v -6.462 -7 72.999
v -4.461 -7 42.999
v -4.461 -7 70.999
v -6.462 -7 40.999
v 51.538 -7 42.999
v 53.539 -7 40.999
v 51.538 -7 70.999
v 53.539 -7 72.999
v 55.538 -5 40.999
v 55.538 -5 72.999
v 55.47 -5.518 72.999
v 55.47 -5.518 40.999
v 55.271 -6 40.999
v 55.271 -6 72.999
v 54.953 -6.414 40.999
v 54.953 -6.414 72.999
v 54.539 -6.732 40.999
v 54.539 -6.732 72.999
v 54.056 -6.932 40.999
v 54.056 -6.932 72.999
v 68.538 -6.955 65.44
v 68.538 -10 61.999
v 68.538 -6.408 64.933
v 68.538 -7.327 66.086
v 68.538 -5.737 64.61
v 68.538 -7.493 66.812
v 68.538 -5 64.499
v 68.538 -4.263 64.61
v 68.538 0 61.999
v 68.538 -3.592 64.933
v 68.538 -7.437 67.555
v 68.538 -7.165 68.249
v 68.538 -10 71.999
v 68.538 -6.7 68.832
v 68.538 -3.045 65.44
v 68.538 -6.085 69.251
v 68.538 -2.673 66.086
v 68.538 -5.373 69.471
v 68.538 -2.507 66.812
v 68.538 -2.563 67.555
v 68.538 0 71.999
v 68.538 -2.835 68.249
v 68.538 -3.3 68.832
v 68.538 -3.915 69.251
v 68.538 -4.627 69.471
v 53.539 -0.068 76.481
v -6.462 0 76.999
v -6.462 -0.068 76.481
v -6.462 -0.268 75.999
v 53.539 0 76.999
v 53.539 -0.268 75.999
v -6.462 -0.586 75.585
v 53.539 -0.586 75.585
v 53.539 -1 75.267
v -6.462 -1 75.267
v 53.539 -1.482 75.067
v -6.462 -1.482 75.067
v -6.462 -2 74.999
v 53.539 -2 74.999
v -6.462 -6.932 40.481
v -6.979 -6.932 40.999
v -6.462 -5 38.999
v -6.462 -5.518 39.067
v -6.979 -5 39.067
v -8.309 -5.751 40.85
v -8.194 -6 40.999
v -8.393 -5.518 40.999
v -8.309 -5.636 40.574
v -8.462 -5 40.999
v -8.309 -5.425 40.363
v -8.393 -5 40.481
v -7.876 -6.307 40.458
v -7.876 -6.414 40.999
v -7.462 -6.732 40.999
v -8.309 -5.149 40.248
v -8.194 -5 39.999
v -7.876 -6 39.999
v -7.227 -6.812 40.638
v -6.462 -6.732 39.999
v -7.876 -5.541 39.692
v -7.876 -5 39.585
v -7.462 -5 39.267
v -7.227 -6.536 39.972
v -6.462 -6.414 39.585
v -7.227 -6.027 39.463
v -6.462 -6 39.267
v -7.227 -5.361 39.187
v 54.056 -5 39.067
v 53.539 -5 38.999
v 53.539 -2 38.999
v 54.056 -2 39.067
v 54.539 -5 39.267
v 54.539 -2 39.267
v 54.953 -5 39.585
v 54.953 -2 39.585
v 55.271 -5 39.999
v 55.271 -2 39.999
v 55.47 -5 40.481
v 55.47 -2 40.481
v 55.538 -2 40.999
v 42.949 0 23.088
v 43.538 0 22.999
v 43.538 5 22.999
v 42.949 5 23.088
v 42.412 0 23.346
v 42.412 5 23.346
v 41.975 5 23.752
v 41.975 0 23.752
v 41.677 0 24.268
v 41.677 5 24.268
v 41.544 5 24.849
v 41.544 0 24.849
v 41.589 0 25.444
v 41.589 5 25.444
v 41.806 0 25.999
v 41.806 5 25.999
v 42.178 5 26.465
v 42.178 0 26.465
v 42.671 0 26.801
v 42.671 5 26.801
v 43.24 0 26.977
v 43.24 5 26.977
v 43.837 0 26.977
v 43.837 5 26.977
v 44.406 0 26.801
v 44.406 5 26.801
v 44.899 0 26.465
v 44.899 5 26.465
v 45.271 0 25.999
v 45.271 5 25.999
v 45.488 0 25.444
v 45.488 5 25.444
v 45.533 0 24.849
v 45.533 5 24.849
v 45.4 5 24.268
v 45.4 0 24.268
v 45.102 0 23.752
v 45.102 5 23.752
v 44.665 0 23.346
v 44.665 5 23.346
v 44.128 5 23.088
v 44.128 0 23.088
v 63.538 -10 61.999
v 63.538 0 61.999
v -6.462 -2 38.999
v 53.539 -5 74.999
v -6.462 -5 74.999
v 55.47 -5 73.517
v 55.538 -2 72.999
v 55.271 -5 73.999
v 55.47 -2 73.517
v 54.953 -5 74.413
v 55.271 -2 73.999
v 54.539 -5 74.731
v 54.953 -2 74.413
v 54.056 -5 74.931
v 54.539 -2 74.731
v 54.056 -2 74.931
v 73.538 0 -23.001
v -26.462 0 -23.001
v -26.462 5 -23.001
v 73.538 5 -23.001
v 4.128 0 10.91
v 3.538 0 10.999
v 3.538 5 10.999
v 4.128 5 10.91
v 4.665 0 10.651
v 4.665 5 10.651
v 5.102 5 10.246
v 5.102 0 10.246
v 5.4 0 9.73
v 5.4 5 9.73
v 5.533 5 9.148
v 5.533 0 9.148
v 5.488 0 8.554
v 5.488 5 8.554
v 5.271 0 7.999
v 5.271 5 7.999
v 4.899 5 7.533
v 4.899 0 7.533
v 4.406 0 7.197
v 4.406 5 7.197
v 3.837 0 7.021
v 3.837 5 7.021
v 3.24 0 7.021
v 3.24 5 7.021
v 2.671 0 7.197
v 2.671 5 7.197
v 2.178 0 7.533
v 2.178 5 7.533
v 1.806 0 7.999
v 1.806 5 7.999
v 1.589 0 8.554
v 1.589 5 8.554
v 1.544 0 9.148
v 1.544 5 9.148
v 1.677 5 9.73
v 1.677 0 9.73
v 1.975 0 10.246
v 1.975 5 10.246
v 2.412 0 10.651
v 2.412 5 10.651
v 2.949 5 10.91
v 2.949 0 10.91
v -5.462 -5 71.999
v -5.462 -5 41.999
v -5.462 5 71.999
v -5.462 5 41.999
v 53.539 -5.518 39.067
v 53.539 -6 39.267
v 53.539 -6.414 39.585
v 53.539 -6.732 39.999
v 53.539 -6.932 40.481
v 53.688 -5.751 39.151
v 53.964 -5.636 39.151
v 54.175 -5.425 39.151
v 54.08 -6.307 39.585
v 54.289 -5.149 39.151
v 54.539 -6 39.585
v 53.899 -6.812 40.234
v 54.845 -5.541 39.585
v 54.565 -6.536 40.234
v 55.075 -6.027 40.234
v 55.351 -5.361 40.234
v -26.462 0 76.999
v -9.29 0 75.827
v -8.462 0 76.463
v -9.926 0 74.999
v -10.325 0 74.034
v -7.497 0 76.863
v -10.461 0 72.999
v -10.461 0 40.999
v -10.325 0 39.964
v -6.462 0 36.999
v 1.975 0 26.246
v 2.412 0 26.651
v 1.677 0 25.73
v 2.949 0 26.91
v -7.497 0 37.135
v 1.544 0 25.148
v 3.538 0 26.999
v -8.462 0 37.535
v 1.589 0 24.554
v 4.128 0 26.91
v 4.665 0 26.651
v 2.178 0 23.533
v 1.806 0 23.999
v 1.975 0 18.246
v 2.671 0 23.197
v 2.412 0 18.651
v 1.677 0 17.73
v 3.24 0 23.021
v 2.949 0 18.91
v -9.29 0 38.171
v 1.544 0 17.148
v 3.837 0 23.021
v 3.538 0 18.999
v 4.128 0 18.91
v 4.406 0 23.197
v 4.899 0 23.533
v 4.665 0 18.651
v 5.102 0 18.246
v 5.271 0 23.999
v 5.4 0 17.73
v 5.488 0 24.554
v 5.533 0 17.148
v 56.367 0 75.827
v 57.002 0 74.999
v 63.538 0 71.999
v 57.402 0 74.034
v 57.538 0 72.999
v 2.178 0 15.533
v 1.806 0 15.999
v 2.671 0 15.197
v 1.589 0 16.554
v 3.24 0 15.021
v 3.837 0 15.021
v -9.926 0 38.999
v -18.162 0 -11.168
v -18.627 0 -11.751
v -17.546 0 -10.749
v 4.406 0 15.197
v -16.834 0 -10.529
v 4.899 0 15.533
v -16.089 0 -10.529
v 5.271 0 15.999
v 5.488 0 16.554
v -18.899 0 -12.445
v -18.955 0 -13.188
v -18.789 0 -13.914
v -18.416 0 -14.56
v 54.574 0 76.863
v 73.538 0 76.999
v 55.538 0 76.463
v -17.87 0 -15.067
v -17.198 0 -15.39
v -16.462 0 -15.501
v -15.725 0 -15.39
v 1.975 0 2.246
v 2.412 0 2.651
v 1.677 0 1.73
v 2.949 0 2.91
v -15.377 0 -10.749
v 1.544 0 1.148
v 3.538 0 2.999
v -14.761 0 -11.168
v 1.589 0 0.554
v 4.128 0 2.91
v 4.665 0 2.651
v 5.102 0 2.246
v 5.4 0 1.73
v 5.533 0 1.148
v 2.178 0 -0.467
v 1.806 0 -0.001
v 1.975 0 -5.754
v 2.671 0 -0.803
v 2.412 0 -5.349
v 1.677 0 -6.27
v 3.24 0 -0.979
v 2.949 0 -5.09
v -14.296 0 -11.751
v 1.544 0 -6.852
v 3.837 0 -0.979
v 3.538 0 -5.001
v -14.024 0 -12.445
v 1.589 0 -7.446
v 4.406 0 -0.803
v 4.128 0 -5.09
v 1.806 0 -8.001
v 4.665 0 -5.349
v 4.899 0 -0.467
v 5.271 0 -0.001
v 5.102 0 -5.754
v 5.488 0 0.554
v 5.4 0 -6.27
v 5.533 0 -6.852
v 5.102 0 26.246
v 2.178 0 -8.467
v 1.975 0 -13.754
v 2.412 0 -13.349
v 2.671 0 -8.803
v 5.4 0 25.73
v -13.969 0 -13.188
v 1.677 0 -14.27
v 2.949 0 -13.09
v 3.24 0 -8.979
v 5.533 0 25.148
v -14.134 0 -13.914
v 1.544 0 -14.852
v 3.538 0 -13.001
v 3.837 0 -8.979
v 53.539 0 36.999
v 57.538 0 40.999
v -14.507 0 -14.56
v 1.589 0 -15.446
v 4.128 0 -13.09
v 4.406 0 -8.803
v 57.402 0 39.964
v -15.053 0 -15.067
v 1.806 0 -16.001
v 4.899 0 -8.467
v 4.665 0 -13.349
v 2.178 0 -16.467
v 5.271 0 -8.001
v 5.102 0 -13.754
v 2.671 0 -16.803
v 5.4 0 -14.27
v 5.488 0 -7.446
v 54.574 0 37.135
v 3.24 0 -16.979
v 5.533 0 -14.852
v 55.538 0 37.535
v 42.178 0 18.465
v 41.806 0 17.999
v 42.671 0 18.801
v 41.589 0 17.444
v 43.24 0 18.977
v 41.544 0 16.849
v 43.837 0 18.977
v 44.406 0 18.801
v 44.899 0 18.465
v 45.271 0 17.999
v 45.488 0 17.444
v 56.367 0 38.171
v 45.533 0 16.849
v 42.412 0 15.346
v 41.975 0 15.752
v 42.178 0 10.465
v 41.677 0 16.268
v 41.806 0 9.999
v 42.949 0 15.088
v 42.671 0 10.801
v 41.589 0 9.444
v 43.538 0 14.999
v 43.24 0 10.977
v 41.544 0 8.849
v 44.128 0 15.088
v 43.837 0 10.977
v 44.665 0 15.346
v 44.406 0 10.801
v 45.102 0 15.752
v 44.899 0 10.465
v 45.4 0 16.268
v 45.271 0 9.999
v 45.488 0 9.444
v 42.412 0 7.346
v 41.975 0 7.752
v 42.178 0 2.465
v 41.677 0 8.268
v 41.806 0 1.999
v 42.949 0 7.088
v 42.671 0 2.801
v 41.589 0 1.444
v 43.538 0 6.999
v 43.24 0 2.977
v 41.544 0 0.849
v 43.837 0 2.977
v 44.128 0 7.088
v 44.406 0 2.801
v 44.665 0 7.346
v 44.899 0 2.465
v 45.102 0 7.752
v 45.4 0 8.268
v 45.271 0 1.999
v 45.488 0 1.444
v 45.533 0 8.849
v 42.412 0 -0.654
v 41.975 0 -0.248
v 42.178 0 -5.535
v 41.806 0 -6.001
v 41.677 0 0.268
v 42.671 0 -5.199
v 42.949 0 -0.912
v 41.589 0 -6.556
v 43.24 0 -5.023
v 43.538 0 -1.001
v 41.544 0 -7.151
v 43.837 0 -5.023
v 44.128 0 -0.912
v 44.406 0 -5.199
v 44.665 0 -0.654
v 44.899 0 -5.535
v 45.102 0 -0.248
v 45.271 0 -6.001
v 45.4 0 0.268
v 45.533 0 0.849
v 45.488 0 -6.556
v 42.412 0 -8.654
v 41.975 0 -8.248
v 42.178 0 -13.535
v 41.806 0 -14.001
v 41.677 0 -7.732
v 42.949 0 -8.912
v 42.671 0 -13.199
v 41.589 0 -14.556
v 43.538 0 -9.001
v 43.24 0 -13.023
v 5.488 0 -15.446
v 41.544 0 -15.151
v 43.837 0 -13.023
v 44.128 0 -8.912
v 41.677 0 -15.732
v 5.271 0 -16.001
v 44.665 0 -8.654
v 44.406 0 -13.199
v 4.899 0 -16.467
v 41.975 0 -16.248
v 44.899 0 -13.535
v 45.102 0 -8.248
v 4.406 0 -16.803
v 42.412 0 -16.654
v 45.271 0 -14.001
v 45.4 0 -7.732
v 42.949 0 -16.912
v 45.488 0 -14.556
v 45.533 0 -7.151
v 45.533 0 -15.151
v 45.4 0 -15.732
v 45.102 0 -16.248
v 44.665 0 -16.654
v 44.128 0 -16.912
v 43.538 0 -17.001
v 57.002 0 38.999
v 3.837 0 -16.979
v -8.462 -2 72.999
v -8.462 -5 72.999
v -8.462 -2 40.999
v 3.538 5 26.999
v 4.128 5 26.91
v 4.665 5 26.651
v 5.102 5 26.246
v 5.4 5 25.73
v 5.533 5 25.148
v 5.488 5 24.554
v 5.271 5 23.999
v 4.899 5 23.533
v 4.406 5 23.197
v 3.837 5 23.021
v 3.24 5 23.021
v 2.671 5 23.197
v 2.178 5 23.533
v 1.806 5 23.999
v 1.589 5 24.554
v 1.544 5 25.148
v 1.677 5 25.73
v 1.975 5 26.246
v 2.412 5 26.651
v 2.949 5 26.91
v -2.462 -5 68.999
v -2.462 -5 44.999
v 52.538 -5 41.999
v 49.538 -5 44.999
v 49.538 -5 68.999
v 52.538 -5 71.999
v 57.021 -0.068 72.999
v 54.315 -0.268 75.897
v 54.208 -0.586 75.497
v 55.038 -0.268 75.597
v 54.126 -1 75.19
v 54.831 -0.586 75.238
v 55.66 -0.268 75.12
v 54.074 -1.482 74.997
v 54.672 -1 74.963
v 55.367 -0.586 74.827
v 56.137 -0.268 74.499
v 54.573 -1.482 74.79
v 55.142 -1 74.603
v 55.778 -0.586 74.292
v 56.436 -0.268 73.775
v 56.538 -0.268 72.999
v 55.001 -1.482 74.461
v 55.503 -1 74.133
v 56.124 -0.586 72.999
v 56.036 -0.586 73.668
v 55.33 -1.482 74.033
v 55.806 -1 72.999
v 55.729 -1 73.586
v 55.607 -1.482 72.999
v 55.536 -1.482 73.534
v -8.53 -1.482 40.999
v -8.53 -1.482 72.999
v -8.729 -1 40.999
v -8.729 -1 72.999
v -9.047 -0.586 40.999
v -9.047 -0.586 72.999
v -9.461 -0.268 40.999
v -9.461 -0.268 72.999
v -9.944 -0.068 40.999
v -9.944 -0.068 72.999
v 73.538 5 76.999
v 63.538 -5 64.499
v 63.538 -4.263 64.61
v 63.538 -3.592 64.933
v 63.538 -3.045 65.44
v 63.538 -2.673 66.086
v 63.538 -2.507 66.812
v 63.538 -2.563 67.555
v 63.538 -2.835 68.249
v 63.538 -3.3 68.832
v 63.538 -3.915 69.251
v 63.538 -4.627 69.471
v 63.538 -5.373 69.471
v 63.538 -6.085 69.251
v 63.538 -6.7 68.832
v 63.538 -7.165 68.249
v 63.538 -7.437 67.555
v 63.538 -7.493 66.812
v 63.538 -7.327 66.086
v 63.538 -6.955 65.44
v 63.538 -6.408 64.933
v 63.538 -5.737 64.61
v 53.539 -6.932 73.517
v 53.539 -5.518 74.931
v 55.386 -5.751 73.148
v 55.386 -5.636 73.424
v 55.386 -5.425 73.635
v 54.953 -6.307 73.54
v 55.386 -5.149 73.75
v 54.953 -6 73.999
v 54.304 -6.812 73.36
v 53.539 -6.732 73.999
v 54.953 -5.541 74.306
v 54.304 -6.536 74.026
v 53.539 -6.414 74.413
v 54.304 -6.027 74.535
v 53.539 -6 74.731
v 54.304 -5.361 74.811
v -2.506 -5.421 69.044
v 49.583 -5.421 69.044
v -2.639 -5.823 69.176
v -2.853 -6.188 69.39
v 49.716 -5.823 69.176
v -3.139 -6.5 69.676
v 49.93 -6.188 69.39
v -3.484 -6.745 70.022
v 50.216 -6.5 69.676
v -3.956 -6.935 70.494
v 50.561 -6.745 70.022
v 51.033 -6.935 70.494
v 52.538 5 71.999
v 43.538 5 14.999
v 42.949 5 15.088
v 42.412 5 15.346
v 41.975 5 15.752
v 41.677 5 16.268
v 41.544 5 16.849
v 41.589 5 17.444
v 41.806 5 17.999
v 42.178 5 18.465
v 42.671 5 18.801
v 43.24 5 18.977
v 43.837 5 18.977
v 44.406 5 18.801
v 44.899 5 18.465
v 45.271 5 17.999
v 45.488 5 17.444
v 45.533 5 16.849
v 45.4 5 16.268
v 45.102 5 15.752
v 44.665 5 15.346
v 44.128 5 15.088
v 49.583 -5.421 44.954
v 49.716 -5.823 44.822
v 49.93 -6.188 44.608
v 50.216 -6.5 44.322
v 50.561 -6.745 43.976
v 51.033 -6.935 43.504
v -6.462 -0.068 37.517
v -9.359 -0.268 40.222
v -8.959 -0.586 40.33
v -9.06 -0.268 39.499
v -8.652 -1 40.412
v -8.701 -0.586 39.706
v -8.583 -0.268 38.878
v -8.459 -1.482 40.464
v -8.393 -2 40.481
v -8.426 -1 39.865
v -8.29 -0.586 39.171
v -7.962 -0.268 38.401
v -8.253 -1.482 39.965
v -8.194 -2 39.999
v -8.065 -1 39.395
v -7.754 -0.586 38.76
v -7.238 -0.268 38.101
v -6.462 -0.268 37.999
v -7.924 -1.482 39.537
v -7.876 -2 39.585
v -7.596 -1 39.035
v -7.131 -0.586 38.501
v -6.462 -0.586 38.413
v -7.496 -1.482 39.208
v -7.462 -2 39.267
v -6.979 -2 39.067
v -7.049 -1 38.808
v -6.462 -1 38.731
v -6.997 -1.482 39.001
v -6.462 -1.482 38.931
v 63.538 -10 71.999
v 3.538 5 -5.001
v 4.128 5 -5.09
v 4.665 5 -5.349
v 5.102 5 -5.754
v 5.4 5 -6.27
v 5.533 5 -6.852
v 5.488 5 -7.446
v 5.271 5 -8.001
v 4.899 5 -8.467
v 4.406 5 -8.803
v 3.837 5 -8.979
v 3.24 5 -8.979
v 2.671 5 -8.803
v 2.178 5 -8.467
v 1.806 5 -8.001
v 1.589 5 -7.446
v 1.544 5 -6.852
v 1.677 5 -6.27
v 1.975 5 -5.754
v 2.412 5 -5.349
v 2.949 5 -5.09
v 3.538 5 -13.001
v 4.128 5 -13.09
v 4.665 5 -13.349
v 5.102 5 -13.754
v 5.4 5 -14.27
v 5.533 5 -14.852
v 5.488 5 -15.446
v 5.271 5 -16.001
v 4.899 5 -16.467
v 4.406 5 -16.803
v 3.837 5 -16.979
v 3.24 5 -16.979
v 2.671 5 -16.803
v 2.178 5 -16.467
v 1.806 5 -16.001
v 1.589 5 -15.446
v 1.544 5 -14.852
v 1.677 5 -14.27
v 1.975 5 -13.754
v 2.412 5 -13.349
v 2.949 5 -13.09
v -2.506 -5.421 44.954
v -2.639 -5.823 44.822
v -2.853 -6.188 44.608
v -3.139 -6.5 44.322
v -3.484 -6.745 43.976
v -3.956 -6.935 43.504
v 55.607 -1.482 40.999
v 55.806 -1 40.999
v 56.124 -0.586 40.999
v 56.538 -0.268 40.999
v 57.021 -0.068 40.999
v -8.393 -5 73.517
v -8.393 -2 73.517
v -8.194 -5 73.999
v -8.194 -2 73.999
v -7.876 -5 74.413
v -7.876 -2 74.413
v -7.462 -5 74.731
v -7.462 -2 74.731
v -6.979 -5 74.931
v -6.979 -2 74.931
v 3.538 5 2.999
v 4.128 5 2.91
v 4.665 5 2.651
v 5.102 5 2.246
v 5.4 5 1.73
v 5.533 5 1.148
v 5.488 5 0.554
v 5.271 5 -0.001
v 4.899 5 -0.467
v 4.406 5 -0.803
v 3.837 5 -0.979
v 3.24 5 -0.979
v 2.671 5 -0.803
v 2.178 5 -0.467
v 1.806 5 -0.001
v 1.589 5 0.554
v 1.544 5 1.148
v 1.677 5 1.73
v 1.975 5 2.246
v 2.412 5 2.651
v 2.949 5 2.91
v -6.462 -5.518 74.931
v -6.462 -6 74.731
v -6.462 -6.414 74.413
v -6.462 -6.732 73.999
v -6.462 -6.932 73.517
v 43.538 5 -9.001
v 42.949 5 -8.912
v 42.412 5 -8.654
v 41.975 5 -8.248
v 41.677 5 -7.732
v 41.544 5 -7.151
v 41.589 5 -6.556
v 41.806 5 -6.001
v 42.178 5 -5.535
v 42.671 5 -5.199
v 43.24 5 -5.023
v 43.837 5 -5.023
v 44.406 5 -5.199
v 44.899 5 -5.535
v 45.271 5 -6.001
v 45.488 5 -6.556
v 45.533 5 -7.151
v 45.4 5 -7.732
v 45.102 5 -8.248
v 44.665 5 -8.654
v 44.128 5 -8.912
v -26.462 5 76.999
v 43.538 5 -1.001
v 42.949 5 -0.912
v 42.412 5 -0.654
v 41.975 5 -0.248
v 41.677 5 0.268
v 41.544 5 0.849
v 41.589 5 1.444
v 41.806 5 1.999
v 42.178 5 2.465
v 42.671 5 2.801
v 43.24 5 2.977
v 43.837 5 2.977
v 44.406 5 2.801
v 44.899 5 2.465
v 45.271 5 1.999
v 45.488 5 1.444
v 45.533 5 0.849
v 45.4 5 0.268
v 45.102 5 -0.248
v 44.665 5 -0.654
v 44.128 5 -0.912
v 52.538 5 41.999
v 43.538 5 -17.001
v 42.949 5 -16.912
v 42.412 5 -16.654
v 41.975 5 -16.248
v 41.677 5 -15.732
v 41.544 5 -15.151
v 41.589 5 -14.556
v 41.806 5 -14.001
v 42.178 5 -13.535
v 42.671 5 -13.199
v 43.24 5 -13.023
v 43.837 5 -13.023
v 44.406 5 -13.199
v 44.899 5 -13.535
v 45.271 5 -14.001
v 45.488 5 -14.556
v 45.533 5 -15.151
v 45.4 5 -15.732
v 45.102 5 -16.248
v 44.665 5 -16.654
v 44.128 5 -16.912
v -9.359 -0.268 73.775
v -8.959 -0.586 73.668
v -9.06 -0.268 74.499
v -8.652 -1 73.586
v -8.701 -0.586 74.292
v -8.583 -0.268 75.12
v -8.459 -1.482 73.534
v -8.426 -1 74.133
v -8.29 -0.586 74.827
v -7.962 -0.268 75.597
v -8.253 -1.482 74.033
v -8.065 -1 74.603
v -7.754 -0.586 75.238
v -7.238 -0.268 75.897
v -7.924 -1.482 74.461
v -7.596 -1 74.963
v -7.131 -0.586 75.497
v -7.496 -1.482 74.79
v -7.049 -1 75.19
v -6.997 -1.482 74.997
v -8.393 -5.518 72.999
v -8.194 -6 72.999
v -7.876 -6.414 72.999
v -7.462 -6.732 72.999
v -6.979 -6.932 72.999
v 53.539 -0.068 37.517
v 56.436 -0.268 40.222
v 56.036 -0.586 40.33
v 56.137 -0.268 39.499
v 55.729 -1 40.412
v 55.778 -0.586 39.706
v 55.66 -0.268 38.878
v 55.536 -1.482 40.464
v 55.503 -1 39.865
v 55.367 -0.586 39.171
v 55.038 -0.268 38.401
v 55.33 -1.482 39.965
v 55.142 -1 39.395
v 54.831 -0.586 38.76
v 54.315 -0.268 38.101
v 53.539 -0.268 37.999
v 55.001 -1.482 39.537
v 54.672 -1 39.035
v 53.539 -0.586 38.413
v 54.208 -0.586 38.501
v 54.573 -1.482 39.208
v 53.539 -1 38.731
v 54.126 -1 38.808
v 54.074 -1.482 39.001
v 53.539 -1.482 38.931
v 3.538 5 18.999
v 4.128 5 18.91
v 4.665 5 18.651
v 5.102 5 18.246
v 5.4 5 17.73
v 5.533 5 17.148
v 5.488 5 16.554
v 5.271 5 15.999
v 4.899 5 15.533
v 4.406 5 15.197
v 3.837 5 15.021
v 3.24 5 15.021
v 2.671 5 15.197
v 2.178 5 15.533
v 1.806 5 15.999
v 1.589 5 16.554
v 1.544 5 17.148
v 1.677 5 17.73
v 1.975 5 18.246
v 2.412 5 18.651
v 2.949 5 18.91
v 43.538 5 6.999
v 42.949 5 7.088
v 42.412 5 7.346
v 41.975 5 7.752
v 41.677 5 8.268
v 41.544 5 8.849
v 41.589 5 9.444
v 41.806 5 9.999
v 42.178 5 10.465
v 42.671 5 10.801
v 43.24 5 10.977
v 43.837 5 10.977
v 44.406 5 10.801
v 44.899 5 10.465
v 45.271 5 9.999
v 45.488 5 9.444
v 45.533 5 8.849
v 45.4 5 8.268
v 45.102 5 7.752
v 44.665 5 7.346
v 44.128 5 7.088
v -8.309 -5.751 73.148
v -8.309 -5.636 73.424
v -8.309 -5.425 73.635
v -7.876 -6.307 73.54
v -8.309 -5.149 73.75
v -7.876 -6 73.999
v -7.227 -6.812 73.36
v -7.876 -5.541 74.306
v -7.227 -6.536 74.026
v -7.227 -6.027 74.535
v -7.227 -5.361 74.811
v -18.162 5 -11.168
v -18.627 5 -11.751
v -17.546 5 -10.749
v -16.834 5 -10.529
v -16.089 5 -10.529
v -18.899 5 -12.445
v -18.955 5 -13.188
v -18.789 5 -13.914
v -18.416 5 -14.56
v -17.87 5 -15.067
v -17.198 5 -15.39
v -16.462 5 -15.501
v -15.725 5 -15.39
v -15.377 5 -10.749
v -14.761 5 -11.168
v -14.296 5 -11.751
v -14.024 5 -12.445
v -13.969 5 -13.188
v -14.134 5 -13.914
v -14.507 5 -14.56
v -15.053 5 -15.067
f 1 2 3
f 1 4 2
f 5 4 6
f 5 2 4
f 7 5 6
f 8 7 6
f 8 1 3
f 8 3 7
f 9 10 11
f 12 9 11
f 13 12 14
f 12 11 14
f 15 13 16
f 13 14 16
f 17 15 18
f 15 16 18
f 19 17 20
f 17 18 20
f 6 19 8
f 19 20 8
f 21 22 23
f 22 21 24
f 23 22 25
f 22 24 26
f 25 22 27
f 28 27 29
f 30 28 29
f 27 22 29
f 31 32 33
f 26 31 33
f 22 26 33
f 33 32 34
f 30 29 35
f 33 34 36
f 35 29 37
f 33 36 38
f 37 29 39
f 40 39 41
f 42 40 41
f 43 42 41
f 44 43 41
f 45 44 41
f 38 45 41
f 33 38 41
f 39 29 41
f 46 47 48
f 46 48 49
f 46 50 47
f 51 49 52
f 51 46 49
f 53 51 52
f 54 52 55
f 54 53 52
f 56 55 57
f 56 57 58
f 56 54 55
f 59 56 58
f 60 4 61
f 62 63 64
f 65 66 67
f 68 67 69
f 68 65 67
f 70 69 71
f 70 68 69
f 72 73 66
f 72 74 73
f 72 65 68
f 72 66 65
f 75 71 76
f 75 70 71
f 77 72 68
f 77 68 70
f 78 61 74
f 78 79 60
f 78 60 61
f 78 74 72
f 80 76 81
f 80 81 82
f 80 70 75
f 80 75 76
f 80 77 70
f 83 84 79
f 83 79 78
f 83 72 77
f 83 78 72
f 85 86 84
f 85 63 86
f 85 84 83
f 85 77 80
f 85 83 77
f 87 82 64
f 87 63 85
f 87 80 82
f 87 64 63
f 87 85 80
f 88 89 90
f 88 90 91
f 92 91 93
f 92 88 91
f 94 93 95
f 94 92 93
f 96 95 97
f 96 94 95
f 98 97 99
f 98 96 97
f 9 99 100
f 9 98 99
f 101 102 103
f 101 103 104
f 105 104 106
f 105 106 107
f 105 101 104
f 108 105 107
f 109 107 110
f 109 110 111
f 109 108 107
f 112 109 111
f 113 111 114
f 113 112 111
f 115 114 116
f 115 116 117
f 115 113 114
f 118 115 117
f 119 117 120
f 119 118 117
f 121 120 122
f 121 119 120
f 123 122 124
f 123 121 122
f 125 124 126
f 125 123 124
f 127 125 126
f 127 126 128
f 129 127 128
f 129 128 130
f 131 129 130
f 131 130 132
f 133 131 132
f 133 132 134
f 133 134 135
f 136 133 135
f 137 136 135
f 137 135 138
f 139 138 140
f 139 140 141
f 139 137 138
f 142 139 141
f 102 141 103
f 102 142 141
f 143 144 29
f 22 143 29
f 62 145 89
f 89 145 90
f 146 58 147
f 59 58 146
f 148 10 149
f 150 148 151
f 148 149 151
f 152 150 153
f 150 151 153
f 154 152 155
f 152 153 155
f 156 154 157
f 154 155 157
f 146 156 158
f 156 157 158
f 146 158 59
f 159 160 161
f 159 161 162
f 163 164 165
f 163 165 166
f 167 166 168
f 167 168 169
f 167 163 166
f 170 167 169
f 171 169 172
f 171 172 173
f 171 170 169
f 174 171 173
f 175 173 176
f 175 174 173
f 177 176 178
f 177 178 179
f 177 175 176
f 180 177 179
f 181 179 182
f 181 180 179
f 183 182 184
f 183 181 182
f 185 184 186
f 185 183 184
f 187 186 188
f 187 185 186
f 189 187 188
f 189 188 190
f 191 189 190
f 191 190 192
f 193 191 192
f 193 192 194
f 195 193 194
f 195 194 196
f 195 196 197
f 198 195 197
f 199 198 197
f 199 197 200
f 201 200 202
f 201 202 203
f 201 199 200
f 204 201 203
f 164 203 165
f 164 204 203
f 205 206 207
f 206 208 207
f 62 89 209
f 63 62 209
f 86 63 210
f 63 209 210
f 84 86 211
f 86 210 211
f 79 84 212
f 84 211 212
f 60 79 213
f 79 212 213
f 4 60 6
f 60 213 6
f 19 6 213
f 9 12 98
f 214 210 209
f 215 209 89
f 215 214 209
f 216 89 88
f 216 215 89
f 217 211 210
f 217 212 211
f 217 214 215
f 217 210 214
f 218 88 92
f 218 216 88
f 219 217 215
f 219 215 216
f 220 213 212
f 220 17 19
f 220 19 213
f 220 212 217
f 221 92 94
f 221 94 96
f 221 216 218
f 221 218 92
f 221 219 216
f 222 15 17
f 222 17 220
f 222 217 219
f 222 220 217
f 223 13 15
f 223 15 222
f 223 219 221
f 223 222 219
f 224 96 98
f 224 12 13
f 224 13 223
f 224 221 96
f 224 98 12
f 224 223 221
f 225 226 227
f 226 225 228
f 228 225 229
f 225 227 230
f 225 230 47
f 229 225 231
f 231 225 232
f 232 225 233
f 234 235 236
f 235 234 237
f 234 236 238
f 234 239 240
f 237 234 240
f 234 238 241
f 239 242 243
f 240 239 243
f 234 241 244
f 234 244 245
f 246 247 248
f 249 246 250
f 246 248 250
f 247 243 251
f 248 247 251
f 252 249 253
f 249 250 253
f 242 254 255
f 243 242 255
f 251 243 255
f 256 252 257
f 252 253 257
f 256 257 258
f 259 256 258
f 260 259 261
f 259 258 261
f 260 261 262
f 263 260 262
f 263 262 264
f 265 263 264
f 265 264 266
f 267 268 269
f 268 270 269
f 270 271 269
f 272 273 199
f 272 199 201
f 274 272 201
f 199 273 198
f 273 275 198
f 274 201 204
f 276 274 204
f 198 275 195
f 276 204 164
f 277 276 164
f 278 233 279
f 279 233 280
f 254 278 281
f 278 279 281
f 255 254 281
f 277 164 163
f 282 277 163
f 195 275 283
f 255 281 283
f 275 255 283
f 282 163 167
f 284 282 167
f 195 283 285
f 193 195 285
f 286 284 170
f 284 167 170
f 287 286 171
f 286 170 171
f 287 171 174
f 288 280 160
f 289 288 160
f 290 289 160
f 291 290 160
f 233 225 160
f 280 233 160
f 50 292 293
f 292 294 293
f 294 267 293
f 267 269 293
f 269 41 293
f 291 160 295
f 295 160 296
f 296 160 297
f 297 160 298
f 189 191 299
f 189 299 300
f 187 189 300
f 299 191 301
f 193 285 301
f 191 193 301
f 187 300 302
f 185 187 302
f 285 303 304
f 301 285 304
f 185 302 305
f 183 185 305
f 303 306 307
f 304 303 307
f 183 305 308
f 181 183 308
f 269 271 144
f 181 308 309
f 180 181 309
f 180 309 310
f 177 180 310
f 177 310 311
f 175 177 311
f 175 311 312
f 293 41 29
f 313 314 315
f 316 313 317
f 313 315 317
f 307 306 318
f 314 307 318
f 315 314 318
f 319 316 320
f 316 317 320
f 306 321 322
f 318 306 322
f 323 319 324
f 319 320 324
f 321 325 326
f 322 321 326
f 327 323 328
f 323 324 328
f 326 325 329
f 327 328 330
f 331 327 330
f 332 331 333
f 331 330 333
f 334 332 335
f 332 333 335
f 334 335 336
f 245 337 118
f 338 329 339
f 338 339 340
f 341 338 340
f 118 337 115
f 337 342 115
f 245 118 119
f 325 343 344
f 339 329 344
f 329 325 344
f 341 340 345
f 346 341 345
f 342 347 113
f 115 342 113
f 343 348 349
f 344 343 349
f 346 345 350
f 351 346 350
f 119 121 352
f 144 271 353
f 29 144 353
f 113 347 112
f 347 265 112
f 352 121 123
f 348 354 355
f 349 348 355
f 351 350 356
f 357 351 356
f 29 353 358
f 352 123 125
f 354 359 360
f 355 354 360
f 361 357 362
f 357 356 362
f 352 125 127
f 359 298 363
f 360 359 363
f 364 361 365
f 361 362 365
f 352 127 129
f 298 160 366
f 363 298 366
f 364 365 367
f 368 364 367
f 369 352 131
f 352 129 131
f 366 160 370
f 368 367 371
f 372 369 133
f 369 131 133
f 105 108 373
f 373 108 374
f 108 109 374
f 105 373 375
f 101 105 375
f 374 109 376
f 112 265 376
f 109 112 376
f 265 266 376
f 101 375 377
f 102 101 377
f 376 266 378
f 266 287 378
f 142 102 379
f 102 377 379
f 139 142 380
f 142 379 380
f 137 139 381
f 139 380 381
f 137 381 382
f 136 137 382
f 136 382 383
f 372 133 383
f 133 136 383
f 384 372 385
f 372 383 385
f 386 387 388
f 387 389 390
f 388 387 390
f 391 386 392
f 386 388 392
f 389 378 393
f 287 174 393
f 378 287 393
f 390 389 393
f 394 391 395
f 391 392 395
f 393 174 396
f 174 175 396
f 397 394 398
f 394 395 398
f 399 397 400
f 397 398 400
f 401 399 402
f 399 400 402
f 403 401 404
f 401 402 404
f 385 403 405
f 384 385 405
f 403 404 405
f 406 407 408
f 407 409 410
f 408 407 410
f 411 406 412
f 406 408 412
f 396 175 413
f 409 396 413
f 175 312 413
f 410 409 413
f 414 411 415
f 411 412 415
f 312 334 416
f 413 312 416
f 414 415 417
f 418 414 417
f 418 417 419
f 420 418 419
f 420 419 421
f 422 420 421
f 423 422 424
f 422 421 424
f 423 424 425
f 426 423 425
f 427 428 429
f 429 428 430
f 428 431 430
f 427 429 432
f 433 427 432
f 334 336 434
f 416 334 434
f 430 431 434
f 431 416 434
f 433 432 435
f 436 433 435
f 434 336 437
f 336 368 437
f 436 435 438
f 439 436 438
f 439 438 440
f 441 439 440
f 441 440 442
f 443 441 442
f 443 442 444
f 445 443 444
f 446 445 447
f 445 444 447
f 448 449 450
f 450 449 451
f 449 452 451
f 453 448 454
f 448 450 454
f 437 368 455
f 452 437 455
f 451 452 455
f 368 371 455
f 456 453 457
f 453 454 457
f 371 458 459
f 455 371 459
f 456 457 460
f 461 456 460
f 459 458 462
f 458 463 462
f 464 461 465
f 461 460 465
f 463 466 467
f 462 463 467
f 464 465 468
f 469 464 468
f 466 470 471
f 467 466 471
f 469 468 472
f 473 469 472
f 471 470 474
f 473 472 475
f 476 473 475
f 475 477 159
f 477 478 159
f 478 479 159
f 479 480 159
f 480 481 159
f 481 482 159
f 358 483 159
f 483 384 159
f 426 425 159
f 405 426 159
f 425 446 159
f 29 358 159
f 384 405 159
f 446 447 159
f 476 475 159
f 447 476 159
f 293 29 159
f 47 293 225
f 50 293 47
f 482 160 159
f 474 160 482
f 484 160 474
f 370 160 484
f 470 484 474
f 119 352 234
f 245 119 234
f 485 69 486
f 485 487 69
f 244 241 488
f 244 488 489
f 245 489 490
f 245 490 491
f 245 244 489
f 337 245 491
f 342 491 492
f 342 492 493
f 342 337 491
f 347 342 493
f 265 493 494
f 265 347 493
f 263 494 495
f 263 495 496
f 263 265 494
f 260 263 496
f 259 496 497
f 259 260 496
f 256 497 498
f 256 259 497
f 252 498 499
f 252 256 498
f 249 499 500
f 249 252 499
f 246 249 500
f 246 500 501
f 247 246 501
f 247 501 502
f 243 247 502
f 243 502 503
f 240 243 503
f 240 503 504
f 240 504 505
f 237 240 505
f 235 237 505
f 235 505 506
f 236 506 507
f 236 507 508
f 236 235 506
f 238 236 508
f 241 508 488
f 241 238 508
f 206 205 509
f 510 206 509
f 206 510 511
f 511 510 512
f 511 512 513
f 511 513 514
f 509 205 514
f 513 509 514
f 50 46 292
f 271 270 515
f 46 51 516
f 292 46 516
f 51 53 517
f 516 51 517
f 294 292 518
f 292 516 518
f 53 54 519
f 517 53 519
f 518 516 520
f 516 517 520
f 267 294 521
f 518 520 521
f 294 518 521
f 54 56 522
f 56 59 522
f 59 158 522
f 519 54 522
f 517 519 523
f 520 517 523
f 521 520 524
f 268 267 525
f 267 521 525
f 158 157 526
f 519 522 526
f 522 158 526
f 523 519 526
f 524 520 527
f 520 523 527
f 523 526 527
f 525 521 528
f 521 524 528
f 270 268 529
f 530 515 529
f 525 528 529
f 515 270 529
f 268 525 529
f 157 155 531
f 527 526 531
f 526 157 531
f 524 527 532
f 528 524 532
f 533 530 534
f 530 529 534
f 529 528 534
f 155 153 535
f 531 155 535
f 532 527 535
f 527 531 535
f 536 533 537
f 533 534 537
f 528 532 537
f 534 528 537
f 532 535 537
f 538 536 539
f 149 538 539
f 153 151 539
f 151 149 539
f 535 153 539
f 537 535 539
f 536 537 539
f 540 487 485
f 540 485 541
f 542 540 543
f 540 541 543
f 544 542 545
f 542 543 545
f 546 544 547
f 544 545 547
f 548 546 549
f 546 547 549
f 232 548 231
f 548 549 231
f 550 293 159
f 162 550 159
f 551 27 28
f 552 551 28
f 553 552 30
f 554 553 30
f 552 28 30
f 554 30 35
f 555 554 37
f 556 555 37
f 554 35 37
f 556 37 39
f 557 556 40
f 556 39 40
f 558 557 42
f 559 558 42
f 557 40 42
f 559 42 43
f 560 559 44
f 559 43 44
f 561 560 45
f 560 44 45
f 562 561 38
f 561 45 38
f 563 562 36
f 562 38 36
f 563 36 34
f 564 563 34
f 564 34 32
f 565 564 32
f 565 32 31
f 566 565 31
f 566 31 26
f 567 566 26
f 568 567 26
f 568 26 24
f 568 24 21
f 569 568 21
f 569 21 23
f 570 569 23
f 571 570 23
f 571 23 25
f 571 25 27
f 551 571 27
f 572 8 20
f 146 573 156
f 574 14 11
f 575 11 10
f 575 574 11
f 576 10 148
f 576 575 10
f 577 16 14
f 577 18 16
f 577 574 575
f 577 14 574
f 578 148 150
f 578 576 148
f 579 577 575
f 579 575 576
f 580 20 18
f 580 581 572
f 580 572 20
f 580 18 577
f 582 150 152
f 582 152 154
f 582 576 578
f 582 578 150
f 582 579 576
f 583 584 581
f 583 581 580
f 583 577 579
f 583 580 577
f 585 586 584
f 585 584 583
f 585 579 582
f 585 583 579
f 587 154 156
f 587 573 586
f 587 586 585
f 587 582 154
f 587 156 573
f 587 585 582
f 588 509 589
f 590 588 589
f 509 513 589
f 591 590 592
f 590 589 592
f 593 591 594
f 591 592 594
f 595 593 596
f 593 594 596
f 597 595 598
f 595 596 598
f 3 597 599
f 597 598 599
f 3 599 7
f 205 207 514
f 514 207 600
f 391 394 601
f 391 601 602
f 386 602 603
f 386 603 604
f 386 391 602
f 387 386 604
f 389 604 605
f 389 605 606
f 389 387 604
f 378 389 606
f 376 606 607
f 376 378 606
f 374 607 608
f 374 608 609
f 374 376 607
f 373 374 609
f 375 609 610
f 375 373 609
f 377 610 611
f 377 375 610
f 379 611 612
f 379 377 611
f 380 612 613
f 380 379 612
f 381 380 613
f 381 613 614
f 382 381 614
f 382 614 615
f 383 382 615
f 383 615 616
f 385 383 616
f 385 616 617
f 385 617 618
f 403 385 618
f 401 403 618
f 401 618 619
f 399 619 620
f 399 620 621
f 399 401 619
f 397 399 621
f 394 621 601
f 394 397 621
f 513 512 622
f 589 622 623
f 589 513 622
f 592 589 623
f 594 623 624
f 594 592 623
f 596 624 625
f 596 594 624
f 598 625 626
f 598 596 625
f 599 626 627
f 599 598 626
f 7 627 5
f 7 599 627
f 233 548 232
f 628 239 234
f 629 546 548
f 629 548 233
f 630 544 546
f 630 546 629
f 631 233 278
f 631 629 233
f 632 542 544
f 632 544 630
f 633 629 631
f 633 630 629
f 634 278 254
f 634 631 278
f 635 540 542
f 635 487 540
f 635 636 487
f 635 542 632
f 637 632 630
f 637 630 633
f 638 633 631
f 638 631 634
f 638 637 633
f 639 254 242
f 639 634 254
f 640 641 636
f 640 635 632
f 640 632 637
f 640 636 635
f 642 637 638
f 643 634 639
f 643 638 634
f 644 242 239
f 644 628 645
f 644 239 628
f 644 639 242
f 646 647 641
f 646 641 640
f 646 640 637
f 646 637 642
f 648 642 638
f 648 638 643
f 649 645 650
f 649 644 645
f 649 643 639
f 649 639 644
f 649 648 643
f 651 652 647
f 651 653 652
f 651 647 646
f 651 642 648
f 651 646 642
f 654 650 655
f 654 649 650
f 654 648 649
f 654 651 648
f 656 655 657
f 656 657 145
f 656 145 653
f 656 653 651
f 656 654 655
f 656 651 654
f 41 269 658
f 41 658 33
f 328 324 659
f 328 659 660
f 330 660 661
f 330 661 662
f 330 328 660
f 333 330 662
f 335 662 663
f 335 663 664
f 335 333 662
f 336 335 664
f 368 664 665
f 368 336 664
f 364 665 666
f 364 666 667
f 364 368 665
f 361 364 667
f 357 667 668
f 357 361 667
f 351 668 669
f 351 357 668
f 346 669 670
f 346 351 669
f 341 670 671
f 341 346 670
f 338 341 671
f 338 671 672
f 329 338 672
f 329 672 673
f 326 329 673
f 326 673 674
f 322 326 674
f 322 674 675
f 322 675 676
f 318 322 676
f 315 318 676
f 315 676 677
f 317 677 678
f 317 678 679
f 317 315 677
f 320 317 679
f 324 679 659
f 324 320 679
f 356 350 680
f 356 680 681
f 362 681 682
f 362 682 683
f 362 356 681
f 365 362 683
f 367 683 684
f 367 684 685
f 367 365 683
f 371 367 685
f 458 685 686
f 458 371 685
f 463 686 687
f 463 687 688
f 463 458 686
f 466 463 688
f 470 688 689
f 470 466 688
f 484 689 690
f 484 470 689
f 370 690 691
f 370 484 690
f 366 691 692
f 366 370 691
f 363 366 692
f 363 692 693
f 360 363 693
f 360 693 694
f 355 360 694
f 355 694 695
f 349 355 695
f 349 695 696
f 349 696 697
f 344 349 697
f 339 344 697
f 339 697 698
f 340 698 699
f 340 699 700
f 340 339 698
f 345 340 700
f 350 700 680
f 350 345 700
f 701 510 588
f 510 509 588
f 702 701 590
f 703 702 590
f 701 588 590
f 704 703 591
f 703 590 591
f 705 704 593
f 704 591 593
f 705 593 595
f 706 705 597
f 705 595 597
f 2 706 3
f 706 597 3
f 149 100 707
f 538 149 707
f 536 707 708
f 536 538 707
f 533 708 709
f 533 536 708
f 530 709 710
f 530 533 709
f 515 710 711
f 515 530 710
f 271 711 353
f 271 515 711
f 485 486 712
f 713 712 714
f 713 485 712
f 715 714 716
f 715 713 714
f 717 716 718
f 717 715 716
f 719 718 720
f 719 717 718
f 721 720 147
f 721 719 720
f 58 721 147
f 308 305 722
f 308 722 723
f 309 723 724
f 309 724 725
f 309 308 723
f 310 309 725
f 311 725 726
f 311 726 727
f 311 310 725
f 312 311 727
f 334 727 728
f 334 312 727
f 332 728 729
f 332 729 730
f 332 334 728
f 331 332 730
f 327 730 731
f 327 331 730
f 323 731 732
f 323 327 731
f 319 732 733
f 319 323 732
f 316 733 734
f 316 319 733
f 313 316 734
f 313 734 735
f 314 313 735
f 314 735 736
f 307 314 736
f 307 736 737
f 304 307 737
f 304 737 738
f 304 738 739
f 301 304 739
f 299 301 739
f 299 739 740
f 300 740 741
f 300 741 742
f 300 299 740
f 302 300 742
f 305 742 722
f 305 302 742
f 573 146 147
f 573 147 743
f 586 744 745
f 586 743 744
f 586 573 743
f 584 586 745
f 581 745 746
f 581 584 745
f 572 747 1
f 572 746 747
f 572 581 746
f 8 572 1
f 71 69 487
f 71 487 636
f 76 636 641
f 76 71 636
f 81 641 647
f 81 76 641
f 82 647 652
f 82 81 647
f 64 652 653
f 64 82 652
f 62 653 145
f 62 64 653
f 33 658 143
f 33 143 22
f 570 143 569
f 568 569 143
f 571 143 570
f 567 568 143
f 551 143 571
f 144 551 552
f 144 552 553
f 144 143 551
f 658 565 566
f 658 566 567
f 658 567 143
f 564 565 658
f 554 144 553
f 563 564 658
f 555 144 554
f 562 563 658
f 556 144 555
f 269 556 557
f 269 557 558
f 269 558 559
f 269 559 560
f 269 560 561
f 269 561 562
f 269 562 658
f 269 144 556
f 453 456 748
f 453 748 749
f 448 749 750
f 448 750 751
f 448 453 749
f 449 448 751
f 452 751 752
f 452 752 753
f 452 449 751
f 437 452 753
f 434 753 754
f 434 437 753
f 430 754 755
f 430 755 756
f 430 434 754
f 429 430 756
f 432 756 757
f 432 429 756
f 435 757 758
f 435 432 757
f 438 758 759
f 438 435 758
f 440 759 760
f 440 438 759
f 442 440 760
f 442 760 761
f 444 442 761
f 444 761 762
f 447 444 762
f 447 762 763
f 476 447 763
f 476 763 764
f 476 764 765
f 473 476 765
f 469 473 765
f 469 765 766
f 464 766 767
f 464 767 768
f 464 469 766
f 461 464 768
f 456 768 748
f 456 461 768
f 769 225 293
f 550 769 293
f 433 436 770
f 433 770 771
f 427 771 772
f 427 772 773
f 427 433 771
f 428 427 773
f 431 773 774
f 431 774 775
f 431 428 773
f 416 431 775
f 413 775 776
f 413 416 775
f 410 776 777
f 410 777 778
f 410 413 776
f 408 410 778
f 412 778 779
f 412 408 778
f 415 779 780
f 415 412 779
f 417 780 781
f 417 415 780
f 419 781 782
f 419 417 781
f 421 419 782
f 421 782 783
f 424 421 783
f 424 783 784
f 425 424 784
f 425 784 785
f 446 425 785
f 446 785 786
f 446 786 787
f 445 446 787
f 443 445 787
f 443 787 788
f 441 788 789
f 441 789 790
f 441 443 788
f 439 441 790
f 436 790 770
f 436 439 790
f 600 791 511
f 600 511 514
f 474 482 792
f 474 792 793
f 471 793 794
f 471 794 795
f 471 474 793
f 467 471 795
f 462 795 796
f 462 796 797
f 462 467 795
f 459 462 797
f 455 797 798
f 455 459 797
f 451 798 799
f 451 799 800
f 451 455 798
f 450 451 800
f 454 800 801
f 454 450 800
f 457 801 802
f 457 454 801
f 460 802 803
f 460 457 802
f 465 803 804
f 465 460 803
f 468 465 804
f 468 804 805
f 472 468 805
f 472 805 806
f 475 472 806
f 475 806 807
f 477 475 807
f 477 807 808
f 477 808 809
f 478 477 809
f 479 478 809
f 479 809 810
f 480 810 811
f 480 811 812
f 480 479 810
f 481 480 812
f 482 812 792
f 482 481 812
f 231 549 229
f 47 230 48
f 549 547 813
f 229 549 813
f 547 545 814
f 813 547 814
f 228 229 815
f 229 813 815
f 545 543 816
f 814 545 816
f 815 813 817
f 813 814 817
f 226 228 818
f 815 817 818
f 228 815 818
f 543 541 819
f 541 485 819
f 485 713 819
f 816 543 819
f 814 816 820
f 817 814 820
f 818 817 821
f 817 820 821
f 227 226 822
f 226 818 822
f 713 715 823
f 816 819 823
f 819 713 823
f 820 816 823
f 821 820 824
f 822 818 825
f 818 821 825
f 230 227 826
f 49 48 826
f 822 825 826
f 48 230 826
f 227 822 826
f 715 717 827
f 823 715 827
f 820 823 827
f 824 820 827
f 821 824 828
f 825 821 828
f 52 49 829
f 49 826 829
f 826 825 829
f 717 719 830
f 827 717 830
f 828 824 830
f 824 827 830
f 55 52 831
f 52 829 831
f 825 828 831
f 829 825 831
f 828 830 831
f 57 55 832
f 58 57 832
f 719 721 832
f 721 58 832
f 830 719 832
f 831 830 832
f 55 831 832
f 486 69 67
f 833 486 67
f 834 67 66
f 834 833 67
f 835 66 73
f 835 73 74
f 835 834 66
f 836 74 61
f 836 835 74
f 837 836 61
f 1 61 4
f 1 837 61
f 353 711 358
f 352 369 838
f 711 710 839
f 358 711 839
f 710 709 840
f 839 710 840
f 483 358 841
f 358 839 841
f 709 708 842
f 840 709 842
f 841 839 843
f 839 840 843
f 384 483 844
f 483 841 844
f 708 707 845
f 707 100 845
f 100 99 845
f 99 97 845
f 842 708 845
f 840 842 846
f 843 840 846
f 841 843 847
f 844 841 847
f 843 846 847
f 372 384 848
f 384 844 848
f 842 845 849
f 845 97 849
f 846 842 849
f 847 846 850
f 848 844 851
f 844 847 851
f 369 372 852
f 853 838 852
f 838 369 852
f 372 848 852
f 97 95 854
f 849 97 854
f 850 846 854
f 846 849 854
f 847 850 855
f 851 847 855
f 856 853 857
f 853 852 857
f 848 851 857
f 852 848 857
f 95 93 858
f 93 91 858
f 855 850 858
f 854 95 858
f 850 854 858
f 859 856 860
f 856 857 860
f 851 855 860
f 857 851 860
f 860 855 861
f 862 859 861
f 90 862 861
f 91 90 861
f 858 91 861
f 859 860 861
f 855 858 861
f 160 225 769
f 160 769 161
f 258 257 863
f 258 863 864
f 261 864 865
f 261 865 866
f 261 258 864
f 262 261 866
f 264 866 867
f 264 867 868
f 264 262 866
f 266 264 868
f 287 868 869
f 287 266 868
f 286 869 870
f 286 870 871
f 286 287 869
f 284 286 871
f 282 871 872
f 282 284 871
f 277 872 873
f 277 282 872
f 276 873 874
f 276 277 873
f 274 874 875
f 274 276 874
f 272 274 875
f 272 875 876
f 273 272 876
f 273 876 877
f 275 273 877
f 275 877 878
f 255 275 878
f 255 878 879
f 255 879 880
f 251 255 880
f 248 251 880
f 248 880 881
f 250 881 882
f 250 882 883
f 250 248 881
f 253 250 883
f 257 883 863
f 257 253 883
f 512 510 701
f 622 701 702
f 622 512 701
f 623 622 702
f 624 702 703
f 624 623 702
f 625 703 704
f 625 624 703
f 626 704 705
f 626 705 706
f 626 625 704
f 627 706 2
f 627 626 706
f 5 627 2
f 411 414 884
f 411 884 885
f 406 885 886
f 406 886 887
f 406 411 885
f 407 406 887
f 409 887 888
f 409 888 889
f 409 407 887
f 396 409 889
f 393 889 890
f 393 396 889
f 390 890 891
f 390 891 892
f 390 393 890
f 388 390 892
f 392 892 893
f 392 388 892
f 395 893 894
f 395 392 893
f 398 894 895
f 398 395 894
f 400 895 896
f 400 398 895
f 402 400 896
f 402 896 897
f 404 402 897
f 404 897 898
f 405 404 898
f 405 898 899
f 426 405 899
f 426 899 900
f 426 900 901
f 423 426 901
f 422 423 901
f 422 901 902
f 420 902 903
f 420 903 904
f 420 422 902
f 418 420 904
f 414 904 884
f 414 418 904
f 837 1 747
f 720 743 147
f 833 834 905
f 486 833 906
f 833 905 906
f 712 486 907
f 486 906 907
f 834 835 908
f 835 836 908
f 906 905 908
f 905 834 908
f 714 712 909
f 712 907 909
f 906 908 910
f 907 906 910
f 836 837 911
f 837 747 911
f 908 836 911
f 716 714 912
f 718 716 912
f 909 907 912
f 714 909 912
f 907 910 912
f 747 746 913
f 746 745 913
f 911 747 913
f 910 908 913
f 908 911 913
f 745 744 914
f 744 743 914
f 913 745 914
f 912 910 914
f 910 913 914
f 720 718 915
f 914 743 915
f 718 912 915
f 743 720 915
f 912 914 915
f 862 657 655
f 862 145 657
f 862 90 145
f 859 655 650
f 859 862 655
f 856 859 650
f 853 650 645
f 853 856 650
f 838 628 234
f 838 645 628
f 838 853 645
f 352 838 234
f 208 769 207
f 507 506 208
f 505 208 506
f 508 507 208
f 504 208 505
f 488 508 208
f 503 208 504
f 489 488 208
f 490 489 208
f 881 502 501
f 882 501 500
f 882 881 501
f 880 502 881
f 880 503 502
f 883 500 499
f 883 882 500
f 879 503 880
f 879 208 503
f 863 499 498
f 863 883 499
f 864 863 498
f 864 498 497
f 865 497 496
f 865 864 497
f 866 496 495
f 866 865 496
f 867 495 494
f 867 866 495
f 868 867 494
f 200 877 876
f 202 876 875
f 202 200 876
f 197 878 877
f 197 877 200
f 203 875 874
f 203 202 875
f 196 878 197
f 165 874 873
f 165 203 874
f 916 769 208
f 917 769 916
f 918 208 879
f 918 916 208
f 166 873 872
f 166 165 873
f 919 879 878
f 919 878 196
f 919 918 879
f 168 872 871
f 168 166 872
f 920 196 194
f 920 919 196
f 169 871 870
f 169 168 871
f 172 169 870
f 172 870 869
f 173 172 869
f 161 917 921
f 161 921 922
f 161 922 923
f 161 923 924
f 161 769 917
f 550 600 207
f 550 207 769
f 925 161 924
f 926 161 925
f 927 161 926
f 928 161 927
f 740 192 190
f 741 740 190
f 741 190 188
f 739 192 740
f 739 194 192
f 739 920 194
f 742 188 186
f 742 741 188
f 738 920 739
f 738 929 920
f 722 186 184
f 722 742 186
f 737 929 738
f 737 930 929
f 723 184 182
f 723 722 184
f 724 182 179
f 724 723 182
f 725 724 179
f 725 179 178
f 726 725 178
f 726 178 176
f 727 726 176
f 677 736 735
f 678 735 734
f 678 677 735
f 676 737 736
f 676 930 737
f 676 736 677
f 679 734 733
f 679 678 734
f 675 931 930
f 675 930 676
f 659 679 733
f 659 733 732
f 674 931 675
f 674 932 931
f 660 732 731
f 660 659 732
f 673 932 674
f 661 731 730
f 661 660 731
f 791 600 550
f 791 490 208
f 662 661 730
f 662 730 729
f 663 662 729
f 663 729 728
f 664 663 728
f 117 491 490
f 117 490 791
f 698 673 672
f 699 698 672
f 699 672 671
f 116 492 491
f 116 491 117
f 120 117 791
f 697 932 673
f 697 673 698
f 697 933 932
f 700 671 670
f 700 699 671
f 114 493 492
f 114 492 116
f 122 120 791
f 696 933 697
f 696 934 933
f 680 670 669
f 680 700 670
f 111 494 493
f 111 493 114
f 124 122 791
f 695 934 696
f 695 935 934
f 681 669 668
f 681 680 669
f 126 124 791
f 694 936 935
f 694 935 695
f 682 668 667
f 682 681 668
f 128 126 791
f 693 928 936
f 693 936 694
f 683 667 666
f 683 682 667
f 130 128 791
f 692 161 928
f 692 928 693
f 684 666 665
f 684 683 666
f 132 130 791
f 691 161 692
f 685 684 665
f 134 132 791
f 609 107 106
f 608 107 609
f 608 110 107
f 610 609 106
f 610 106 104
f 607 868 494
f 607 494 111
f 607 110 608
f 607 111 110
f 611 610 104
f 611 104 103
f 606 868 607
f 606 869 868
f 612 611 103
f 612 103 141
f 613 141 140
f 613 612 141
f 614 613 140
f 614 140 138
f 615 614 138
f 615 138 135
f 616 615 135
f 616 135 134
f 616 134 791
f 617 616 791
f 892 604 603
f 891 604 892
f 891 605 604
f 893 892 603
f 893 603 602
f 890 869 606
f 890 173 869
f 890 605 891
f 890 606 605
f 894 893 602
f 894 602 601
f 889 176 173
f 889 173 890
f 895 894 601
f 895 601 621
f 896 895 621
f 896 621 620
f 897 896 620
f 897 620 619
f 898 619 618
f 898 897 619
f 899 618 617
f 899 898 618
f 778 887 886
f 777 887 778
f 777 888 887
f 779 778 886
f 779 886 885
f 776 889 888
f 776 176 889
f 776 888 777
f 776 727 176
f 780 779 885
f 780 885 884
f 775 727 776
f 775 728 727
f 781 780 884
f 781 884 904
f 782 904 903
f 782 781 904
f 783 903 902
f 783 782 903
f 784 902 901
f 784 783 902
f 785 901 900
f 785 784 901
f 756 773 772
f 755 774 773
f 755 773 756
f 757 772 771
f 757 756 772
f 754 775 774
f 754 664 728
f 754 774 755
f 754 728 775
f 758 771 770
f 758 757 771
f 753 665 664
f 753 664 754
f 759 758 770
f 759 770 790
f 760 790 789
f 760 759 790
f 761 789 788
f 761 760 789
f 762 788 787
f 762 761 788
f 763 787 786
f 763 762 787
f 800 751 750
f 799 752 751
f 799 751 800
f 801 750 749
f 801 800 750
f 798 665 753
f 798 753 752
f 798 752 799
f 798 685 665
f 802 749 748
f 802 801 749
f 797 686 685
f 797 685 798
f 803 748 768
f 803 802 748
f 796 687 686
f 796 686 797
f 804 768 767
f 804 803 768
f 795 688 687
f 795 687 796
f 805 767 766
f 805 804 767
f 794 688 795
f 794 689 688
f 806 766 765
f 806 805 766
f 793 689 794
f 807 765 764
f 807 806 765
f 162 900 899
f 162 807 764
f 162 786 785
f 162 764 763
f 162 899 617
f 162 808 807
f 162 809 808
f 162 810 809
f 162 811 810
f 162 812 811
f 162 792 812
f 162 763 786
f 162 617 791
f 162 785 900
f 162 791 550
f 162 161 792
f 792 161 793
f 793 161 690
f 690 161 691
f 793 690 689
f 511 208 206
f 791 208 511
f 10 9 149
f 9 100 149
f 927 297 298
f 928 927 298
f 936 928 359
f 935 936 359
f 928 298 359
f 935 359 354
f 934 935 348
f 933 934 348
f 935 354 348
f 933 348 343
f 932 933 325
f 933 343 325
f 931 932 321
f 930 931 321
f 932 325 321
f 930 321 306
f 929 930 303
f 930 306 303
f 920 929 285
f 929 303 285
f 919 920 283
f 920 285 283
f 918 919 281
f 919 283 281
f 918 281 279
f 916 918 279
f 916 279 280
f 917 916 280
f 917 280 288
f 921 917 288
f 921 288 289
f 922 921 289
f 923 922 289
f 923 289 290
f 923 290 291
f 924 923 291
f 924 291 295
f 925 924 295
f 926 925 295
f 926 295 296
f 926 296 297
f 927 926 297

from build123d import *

# Parameters (mm, degrees)
SKETCH1_W           = 100
SKETCH1_H           = 100
SKETCH1_R           = 2
SKETCH1_W_2         = 58
SKETCH1_H_2         = 30
BOSS_EXTRUDE1_DEPTH = 5
SKETCH2_W           = 64
SKETCH2_H           = 36
SKETCH2_W_2         = 58
SKETCH2_H_2         = 30
BOSS_EXTRUDE2_DEPTH = 5
SKETCH3_W           = 64
SKETCH3_H           = 36
SKETCH3_W_2         = 52
SKETCH3_H_2         = 24
BOSS_EXTRUDE3_DEPTH = 2
FILLET2_R           = 2
SKETCH5_W           = 5
SKETCH5_H           = 10
BOSS_EXTRUDE4_DEPTH = 10
SKETCH6_R           = 2.5
CUT_EXTRUDE2_DEPTH  = 8
SKETCH7_R           = 2.5
CUT_EXTRUDE3_DEPTH  = 8


with BuildPart() as part:
    # Sketch1 → Boss-Extrude1 (new body)
    with BuildSketch(Plane(origin=(0, 0, 0), x_dir=(1, 0, 0), z_dir=(0, 1, 0))):
        with Locations((23.538461538, -26.998952175)):
            Rectangle(SKETCH1_W, SKETCH1_H)
        with Locations(Location((3.538461538, 15.001047825, 0), (0, 0, 270))):
            Circle(SKETCH1_R, mode=Mode.SUBTRACT)
        with Locations(Location((3.538461538, 7.001047825, 0), (0, 0, 270))):
            Circle(SKETCH1_R, mode=Mode.SUBTRACT)
        with Locations(Location((3.538461538, -0.998952175, 0), (0, 0, 270))):
            Circle(SKETCH1_R, mode=Mode.SUBTRACT)
        with Locations(Location((3.538461538, -8.998952175, 0), (0, 0, 270))):
            Circle(SKETCH1_R, mode=Mode.SUBTRACT)
        with Locations(Location((3.538461538, -16.998952175, 0), (0, 0, 270))):
            Circle(SKETCH1_R, mode=Mode.SUBTRACT)
        with Locations(Location((3.538461538, -24.998952175, 0), (0, 0, 270))):
            Circle(SKETCH1_R, mode=Mode.SUBTRACT)
        with Locations(Location((43.538461538, -24.998952175, 0), (0, 0, 90))):
            Circle(SKETCH1_R, mode=Mode.SUBTRACT)
        with Locations(Location((43.538461538, -16.998952175, 0), (0, 0, 90))):
            Circle(SKETCH1_R, mode=Mode.SUBTRACT)
        with Locations(Location((43.538461538, -8.998952175, 0), (0, 0, 90))):
            Circle(SKETCH1_R, mode=Mode.SUBTRACT)
        with Locations(Location((43.538461538, -0.998952175, 0), (0, 0, 90))):
            Circle(SKETCH1_R, mode=Mode.SUBTRACT)
        with Locations(Location((43.538461538, 7.001047825, 0), (0, 0, 90))):
            Circle(SKETCH1_R, mode=Mode.SUBTRACT)
        with Locations(Location((43.538461538, 15.001047825, 0), (0, 0, 90))):
            Circle(SKETCH1_R, mode=Mode.SUBTRACT)
        with Locations((23.538461538, -56.998952175)):
            Rectangle(SKETCH1_W_2, SKETCH1_H_2, mode=Mode.SUBTRACT)
    extrude(amount=BOSS_EXTRUDE1_DEPTH)

    # Sketch2 → Boss-Extrude2 (add)
    with BuildSketch(Plane.XZ):
        with Locations((23.538461538, 56.998952175)):
            Rectangle(SKETCH2_W, SKETCH2_H)
        with Locations((23.538461538, 56.998952175)):
            Rectangle(SKETCH2_W_2, SKETCH2_H_2, mode=Mode.SUBTRACT)
    extrude(amount=BOSS_EXTRUDE2_DEPTH)

    # Sketch3 → Boss-Extrude3 (add)
    with BuildSketch(Plane.XZ.offset(5)):
        with Locations((23.538461538, 56.998952175)):
            Rectangle(SKETCH3_W, SKETCH3_H)
        with Locations((23.538461538, 56.998952175)):
            Rectangle(SKETCH3_W_2, SKETCH3_H_2, mode=Mode.SUBTRACT)
    extrude(amount=BOSS_EXTRUDE3_DEPTH)

    # Fillet2
    fillet2_edges = [part.edges().sort_by_distance(p)[0] for p in [
        (49.538461538, -7, 56.998952175),
        (23.538461538, -7, 68.998952175),
        (-2.461538462, -7, 56.998952175),
        (23.538461538, -7, 44.998952175),
        (23.538461538, -7, 74.998952175),
        (55.538461538, -7, 56.998952175),
        (23.538461538, -7, 38.998952175),
        (-8.461538462, -7, 56.998952175),
        (-8.461538462, -3.5, 38.998952175),
        (55.538461538, -3.5, 38.998952175),
        (55.538461538, -3.5, 74.998952175),
        (-8.461538462, -3.5, 74.998952175),
        (-8.461538462, 0, 56.998952175),
        (23.538461538, 0, 74.998952175),
        (55.538461538, 0, 56.998952175),
        (23.538461538, 0, 38.998952175),
    ]]
    fillet(fillet2_edges, radius=FILLET2_R - 0.0001)  # a hair under: the kernel refuses the full size

    # Sketch5 → Boss-Extrude4 (add)
    with BuildSketch(Plane.XZ):
        with Locations((66.038461538, 66.998952175)):
            Rectangle(SKETCH5_W, SKETCH5_H)
    extrude(amount=BOSS_EXTRUDE4_DEPTH)

    # Sketch6 → Cut-Extrude2 (cut)
    with BuildSketch(Plane(origin=(68.538461538, 0, 0), x_dir=(0, 0, -1), z_dir=(1, 0, 0))):
        with Locations((-66.998952175, -5)):
            Circle(SKETCH6_R)
    extrude(amount=-CUT_EXTRUDE2_DEPTH, mode=Mode.SUBTRACT)

    # Sketch7 → Cut-Extrude3 (cut)
    with BuildSketch(Plane.XZ):
        with Locations(Location((-16.461538462, -13.001047825, 0), (0, 0, 270))):
            Circle(SKETCH7_R)
    extrude(amount=-CUT_EXTRUDE3_DEPTH, mode=Mode.SUBTRACT)


solid = part.part
